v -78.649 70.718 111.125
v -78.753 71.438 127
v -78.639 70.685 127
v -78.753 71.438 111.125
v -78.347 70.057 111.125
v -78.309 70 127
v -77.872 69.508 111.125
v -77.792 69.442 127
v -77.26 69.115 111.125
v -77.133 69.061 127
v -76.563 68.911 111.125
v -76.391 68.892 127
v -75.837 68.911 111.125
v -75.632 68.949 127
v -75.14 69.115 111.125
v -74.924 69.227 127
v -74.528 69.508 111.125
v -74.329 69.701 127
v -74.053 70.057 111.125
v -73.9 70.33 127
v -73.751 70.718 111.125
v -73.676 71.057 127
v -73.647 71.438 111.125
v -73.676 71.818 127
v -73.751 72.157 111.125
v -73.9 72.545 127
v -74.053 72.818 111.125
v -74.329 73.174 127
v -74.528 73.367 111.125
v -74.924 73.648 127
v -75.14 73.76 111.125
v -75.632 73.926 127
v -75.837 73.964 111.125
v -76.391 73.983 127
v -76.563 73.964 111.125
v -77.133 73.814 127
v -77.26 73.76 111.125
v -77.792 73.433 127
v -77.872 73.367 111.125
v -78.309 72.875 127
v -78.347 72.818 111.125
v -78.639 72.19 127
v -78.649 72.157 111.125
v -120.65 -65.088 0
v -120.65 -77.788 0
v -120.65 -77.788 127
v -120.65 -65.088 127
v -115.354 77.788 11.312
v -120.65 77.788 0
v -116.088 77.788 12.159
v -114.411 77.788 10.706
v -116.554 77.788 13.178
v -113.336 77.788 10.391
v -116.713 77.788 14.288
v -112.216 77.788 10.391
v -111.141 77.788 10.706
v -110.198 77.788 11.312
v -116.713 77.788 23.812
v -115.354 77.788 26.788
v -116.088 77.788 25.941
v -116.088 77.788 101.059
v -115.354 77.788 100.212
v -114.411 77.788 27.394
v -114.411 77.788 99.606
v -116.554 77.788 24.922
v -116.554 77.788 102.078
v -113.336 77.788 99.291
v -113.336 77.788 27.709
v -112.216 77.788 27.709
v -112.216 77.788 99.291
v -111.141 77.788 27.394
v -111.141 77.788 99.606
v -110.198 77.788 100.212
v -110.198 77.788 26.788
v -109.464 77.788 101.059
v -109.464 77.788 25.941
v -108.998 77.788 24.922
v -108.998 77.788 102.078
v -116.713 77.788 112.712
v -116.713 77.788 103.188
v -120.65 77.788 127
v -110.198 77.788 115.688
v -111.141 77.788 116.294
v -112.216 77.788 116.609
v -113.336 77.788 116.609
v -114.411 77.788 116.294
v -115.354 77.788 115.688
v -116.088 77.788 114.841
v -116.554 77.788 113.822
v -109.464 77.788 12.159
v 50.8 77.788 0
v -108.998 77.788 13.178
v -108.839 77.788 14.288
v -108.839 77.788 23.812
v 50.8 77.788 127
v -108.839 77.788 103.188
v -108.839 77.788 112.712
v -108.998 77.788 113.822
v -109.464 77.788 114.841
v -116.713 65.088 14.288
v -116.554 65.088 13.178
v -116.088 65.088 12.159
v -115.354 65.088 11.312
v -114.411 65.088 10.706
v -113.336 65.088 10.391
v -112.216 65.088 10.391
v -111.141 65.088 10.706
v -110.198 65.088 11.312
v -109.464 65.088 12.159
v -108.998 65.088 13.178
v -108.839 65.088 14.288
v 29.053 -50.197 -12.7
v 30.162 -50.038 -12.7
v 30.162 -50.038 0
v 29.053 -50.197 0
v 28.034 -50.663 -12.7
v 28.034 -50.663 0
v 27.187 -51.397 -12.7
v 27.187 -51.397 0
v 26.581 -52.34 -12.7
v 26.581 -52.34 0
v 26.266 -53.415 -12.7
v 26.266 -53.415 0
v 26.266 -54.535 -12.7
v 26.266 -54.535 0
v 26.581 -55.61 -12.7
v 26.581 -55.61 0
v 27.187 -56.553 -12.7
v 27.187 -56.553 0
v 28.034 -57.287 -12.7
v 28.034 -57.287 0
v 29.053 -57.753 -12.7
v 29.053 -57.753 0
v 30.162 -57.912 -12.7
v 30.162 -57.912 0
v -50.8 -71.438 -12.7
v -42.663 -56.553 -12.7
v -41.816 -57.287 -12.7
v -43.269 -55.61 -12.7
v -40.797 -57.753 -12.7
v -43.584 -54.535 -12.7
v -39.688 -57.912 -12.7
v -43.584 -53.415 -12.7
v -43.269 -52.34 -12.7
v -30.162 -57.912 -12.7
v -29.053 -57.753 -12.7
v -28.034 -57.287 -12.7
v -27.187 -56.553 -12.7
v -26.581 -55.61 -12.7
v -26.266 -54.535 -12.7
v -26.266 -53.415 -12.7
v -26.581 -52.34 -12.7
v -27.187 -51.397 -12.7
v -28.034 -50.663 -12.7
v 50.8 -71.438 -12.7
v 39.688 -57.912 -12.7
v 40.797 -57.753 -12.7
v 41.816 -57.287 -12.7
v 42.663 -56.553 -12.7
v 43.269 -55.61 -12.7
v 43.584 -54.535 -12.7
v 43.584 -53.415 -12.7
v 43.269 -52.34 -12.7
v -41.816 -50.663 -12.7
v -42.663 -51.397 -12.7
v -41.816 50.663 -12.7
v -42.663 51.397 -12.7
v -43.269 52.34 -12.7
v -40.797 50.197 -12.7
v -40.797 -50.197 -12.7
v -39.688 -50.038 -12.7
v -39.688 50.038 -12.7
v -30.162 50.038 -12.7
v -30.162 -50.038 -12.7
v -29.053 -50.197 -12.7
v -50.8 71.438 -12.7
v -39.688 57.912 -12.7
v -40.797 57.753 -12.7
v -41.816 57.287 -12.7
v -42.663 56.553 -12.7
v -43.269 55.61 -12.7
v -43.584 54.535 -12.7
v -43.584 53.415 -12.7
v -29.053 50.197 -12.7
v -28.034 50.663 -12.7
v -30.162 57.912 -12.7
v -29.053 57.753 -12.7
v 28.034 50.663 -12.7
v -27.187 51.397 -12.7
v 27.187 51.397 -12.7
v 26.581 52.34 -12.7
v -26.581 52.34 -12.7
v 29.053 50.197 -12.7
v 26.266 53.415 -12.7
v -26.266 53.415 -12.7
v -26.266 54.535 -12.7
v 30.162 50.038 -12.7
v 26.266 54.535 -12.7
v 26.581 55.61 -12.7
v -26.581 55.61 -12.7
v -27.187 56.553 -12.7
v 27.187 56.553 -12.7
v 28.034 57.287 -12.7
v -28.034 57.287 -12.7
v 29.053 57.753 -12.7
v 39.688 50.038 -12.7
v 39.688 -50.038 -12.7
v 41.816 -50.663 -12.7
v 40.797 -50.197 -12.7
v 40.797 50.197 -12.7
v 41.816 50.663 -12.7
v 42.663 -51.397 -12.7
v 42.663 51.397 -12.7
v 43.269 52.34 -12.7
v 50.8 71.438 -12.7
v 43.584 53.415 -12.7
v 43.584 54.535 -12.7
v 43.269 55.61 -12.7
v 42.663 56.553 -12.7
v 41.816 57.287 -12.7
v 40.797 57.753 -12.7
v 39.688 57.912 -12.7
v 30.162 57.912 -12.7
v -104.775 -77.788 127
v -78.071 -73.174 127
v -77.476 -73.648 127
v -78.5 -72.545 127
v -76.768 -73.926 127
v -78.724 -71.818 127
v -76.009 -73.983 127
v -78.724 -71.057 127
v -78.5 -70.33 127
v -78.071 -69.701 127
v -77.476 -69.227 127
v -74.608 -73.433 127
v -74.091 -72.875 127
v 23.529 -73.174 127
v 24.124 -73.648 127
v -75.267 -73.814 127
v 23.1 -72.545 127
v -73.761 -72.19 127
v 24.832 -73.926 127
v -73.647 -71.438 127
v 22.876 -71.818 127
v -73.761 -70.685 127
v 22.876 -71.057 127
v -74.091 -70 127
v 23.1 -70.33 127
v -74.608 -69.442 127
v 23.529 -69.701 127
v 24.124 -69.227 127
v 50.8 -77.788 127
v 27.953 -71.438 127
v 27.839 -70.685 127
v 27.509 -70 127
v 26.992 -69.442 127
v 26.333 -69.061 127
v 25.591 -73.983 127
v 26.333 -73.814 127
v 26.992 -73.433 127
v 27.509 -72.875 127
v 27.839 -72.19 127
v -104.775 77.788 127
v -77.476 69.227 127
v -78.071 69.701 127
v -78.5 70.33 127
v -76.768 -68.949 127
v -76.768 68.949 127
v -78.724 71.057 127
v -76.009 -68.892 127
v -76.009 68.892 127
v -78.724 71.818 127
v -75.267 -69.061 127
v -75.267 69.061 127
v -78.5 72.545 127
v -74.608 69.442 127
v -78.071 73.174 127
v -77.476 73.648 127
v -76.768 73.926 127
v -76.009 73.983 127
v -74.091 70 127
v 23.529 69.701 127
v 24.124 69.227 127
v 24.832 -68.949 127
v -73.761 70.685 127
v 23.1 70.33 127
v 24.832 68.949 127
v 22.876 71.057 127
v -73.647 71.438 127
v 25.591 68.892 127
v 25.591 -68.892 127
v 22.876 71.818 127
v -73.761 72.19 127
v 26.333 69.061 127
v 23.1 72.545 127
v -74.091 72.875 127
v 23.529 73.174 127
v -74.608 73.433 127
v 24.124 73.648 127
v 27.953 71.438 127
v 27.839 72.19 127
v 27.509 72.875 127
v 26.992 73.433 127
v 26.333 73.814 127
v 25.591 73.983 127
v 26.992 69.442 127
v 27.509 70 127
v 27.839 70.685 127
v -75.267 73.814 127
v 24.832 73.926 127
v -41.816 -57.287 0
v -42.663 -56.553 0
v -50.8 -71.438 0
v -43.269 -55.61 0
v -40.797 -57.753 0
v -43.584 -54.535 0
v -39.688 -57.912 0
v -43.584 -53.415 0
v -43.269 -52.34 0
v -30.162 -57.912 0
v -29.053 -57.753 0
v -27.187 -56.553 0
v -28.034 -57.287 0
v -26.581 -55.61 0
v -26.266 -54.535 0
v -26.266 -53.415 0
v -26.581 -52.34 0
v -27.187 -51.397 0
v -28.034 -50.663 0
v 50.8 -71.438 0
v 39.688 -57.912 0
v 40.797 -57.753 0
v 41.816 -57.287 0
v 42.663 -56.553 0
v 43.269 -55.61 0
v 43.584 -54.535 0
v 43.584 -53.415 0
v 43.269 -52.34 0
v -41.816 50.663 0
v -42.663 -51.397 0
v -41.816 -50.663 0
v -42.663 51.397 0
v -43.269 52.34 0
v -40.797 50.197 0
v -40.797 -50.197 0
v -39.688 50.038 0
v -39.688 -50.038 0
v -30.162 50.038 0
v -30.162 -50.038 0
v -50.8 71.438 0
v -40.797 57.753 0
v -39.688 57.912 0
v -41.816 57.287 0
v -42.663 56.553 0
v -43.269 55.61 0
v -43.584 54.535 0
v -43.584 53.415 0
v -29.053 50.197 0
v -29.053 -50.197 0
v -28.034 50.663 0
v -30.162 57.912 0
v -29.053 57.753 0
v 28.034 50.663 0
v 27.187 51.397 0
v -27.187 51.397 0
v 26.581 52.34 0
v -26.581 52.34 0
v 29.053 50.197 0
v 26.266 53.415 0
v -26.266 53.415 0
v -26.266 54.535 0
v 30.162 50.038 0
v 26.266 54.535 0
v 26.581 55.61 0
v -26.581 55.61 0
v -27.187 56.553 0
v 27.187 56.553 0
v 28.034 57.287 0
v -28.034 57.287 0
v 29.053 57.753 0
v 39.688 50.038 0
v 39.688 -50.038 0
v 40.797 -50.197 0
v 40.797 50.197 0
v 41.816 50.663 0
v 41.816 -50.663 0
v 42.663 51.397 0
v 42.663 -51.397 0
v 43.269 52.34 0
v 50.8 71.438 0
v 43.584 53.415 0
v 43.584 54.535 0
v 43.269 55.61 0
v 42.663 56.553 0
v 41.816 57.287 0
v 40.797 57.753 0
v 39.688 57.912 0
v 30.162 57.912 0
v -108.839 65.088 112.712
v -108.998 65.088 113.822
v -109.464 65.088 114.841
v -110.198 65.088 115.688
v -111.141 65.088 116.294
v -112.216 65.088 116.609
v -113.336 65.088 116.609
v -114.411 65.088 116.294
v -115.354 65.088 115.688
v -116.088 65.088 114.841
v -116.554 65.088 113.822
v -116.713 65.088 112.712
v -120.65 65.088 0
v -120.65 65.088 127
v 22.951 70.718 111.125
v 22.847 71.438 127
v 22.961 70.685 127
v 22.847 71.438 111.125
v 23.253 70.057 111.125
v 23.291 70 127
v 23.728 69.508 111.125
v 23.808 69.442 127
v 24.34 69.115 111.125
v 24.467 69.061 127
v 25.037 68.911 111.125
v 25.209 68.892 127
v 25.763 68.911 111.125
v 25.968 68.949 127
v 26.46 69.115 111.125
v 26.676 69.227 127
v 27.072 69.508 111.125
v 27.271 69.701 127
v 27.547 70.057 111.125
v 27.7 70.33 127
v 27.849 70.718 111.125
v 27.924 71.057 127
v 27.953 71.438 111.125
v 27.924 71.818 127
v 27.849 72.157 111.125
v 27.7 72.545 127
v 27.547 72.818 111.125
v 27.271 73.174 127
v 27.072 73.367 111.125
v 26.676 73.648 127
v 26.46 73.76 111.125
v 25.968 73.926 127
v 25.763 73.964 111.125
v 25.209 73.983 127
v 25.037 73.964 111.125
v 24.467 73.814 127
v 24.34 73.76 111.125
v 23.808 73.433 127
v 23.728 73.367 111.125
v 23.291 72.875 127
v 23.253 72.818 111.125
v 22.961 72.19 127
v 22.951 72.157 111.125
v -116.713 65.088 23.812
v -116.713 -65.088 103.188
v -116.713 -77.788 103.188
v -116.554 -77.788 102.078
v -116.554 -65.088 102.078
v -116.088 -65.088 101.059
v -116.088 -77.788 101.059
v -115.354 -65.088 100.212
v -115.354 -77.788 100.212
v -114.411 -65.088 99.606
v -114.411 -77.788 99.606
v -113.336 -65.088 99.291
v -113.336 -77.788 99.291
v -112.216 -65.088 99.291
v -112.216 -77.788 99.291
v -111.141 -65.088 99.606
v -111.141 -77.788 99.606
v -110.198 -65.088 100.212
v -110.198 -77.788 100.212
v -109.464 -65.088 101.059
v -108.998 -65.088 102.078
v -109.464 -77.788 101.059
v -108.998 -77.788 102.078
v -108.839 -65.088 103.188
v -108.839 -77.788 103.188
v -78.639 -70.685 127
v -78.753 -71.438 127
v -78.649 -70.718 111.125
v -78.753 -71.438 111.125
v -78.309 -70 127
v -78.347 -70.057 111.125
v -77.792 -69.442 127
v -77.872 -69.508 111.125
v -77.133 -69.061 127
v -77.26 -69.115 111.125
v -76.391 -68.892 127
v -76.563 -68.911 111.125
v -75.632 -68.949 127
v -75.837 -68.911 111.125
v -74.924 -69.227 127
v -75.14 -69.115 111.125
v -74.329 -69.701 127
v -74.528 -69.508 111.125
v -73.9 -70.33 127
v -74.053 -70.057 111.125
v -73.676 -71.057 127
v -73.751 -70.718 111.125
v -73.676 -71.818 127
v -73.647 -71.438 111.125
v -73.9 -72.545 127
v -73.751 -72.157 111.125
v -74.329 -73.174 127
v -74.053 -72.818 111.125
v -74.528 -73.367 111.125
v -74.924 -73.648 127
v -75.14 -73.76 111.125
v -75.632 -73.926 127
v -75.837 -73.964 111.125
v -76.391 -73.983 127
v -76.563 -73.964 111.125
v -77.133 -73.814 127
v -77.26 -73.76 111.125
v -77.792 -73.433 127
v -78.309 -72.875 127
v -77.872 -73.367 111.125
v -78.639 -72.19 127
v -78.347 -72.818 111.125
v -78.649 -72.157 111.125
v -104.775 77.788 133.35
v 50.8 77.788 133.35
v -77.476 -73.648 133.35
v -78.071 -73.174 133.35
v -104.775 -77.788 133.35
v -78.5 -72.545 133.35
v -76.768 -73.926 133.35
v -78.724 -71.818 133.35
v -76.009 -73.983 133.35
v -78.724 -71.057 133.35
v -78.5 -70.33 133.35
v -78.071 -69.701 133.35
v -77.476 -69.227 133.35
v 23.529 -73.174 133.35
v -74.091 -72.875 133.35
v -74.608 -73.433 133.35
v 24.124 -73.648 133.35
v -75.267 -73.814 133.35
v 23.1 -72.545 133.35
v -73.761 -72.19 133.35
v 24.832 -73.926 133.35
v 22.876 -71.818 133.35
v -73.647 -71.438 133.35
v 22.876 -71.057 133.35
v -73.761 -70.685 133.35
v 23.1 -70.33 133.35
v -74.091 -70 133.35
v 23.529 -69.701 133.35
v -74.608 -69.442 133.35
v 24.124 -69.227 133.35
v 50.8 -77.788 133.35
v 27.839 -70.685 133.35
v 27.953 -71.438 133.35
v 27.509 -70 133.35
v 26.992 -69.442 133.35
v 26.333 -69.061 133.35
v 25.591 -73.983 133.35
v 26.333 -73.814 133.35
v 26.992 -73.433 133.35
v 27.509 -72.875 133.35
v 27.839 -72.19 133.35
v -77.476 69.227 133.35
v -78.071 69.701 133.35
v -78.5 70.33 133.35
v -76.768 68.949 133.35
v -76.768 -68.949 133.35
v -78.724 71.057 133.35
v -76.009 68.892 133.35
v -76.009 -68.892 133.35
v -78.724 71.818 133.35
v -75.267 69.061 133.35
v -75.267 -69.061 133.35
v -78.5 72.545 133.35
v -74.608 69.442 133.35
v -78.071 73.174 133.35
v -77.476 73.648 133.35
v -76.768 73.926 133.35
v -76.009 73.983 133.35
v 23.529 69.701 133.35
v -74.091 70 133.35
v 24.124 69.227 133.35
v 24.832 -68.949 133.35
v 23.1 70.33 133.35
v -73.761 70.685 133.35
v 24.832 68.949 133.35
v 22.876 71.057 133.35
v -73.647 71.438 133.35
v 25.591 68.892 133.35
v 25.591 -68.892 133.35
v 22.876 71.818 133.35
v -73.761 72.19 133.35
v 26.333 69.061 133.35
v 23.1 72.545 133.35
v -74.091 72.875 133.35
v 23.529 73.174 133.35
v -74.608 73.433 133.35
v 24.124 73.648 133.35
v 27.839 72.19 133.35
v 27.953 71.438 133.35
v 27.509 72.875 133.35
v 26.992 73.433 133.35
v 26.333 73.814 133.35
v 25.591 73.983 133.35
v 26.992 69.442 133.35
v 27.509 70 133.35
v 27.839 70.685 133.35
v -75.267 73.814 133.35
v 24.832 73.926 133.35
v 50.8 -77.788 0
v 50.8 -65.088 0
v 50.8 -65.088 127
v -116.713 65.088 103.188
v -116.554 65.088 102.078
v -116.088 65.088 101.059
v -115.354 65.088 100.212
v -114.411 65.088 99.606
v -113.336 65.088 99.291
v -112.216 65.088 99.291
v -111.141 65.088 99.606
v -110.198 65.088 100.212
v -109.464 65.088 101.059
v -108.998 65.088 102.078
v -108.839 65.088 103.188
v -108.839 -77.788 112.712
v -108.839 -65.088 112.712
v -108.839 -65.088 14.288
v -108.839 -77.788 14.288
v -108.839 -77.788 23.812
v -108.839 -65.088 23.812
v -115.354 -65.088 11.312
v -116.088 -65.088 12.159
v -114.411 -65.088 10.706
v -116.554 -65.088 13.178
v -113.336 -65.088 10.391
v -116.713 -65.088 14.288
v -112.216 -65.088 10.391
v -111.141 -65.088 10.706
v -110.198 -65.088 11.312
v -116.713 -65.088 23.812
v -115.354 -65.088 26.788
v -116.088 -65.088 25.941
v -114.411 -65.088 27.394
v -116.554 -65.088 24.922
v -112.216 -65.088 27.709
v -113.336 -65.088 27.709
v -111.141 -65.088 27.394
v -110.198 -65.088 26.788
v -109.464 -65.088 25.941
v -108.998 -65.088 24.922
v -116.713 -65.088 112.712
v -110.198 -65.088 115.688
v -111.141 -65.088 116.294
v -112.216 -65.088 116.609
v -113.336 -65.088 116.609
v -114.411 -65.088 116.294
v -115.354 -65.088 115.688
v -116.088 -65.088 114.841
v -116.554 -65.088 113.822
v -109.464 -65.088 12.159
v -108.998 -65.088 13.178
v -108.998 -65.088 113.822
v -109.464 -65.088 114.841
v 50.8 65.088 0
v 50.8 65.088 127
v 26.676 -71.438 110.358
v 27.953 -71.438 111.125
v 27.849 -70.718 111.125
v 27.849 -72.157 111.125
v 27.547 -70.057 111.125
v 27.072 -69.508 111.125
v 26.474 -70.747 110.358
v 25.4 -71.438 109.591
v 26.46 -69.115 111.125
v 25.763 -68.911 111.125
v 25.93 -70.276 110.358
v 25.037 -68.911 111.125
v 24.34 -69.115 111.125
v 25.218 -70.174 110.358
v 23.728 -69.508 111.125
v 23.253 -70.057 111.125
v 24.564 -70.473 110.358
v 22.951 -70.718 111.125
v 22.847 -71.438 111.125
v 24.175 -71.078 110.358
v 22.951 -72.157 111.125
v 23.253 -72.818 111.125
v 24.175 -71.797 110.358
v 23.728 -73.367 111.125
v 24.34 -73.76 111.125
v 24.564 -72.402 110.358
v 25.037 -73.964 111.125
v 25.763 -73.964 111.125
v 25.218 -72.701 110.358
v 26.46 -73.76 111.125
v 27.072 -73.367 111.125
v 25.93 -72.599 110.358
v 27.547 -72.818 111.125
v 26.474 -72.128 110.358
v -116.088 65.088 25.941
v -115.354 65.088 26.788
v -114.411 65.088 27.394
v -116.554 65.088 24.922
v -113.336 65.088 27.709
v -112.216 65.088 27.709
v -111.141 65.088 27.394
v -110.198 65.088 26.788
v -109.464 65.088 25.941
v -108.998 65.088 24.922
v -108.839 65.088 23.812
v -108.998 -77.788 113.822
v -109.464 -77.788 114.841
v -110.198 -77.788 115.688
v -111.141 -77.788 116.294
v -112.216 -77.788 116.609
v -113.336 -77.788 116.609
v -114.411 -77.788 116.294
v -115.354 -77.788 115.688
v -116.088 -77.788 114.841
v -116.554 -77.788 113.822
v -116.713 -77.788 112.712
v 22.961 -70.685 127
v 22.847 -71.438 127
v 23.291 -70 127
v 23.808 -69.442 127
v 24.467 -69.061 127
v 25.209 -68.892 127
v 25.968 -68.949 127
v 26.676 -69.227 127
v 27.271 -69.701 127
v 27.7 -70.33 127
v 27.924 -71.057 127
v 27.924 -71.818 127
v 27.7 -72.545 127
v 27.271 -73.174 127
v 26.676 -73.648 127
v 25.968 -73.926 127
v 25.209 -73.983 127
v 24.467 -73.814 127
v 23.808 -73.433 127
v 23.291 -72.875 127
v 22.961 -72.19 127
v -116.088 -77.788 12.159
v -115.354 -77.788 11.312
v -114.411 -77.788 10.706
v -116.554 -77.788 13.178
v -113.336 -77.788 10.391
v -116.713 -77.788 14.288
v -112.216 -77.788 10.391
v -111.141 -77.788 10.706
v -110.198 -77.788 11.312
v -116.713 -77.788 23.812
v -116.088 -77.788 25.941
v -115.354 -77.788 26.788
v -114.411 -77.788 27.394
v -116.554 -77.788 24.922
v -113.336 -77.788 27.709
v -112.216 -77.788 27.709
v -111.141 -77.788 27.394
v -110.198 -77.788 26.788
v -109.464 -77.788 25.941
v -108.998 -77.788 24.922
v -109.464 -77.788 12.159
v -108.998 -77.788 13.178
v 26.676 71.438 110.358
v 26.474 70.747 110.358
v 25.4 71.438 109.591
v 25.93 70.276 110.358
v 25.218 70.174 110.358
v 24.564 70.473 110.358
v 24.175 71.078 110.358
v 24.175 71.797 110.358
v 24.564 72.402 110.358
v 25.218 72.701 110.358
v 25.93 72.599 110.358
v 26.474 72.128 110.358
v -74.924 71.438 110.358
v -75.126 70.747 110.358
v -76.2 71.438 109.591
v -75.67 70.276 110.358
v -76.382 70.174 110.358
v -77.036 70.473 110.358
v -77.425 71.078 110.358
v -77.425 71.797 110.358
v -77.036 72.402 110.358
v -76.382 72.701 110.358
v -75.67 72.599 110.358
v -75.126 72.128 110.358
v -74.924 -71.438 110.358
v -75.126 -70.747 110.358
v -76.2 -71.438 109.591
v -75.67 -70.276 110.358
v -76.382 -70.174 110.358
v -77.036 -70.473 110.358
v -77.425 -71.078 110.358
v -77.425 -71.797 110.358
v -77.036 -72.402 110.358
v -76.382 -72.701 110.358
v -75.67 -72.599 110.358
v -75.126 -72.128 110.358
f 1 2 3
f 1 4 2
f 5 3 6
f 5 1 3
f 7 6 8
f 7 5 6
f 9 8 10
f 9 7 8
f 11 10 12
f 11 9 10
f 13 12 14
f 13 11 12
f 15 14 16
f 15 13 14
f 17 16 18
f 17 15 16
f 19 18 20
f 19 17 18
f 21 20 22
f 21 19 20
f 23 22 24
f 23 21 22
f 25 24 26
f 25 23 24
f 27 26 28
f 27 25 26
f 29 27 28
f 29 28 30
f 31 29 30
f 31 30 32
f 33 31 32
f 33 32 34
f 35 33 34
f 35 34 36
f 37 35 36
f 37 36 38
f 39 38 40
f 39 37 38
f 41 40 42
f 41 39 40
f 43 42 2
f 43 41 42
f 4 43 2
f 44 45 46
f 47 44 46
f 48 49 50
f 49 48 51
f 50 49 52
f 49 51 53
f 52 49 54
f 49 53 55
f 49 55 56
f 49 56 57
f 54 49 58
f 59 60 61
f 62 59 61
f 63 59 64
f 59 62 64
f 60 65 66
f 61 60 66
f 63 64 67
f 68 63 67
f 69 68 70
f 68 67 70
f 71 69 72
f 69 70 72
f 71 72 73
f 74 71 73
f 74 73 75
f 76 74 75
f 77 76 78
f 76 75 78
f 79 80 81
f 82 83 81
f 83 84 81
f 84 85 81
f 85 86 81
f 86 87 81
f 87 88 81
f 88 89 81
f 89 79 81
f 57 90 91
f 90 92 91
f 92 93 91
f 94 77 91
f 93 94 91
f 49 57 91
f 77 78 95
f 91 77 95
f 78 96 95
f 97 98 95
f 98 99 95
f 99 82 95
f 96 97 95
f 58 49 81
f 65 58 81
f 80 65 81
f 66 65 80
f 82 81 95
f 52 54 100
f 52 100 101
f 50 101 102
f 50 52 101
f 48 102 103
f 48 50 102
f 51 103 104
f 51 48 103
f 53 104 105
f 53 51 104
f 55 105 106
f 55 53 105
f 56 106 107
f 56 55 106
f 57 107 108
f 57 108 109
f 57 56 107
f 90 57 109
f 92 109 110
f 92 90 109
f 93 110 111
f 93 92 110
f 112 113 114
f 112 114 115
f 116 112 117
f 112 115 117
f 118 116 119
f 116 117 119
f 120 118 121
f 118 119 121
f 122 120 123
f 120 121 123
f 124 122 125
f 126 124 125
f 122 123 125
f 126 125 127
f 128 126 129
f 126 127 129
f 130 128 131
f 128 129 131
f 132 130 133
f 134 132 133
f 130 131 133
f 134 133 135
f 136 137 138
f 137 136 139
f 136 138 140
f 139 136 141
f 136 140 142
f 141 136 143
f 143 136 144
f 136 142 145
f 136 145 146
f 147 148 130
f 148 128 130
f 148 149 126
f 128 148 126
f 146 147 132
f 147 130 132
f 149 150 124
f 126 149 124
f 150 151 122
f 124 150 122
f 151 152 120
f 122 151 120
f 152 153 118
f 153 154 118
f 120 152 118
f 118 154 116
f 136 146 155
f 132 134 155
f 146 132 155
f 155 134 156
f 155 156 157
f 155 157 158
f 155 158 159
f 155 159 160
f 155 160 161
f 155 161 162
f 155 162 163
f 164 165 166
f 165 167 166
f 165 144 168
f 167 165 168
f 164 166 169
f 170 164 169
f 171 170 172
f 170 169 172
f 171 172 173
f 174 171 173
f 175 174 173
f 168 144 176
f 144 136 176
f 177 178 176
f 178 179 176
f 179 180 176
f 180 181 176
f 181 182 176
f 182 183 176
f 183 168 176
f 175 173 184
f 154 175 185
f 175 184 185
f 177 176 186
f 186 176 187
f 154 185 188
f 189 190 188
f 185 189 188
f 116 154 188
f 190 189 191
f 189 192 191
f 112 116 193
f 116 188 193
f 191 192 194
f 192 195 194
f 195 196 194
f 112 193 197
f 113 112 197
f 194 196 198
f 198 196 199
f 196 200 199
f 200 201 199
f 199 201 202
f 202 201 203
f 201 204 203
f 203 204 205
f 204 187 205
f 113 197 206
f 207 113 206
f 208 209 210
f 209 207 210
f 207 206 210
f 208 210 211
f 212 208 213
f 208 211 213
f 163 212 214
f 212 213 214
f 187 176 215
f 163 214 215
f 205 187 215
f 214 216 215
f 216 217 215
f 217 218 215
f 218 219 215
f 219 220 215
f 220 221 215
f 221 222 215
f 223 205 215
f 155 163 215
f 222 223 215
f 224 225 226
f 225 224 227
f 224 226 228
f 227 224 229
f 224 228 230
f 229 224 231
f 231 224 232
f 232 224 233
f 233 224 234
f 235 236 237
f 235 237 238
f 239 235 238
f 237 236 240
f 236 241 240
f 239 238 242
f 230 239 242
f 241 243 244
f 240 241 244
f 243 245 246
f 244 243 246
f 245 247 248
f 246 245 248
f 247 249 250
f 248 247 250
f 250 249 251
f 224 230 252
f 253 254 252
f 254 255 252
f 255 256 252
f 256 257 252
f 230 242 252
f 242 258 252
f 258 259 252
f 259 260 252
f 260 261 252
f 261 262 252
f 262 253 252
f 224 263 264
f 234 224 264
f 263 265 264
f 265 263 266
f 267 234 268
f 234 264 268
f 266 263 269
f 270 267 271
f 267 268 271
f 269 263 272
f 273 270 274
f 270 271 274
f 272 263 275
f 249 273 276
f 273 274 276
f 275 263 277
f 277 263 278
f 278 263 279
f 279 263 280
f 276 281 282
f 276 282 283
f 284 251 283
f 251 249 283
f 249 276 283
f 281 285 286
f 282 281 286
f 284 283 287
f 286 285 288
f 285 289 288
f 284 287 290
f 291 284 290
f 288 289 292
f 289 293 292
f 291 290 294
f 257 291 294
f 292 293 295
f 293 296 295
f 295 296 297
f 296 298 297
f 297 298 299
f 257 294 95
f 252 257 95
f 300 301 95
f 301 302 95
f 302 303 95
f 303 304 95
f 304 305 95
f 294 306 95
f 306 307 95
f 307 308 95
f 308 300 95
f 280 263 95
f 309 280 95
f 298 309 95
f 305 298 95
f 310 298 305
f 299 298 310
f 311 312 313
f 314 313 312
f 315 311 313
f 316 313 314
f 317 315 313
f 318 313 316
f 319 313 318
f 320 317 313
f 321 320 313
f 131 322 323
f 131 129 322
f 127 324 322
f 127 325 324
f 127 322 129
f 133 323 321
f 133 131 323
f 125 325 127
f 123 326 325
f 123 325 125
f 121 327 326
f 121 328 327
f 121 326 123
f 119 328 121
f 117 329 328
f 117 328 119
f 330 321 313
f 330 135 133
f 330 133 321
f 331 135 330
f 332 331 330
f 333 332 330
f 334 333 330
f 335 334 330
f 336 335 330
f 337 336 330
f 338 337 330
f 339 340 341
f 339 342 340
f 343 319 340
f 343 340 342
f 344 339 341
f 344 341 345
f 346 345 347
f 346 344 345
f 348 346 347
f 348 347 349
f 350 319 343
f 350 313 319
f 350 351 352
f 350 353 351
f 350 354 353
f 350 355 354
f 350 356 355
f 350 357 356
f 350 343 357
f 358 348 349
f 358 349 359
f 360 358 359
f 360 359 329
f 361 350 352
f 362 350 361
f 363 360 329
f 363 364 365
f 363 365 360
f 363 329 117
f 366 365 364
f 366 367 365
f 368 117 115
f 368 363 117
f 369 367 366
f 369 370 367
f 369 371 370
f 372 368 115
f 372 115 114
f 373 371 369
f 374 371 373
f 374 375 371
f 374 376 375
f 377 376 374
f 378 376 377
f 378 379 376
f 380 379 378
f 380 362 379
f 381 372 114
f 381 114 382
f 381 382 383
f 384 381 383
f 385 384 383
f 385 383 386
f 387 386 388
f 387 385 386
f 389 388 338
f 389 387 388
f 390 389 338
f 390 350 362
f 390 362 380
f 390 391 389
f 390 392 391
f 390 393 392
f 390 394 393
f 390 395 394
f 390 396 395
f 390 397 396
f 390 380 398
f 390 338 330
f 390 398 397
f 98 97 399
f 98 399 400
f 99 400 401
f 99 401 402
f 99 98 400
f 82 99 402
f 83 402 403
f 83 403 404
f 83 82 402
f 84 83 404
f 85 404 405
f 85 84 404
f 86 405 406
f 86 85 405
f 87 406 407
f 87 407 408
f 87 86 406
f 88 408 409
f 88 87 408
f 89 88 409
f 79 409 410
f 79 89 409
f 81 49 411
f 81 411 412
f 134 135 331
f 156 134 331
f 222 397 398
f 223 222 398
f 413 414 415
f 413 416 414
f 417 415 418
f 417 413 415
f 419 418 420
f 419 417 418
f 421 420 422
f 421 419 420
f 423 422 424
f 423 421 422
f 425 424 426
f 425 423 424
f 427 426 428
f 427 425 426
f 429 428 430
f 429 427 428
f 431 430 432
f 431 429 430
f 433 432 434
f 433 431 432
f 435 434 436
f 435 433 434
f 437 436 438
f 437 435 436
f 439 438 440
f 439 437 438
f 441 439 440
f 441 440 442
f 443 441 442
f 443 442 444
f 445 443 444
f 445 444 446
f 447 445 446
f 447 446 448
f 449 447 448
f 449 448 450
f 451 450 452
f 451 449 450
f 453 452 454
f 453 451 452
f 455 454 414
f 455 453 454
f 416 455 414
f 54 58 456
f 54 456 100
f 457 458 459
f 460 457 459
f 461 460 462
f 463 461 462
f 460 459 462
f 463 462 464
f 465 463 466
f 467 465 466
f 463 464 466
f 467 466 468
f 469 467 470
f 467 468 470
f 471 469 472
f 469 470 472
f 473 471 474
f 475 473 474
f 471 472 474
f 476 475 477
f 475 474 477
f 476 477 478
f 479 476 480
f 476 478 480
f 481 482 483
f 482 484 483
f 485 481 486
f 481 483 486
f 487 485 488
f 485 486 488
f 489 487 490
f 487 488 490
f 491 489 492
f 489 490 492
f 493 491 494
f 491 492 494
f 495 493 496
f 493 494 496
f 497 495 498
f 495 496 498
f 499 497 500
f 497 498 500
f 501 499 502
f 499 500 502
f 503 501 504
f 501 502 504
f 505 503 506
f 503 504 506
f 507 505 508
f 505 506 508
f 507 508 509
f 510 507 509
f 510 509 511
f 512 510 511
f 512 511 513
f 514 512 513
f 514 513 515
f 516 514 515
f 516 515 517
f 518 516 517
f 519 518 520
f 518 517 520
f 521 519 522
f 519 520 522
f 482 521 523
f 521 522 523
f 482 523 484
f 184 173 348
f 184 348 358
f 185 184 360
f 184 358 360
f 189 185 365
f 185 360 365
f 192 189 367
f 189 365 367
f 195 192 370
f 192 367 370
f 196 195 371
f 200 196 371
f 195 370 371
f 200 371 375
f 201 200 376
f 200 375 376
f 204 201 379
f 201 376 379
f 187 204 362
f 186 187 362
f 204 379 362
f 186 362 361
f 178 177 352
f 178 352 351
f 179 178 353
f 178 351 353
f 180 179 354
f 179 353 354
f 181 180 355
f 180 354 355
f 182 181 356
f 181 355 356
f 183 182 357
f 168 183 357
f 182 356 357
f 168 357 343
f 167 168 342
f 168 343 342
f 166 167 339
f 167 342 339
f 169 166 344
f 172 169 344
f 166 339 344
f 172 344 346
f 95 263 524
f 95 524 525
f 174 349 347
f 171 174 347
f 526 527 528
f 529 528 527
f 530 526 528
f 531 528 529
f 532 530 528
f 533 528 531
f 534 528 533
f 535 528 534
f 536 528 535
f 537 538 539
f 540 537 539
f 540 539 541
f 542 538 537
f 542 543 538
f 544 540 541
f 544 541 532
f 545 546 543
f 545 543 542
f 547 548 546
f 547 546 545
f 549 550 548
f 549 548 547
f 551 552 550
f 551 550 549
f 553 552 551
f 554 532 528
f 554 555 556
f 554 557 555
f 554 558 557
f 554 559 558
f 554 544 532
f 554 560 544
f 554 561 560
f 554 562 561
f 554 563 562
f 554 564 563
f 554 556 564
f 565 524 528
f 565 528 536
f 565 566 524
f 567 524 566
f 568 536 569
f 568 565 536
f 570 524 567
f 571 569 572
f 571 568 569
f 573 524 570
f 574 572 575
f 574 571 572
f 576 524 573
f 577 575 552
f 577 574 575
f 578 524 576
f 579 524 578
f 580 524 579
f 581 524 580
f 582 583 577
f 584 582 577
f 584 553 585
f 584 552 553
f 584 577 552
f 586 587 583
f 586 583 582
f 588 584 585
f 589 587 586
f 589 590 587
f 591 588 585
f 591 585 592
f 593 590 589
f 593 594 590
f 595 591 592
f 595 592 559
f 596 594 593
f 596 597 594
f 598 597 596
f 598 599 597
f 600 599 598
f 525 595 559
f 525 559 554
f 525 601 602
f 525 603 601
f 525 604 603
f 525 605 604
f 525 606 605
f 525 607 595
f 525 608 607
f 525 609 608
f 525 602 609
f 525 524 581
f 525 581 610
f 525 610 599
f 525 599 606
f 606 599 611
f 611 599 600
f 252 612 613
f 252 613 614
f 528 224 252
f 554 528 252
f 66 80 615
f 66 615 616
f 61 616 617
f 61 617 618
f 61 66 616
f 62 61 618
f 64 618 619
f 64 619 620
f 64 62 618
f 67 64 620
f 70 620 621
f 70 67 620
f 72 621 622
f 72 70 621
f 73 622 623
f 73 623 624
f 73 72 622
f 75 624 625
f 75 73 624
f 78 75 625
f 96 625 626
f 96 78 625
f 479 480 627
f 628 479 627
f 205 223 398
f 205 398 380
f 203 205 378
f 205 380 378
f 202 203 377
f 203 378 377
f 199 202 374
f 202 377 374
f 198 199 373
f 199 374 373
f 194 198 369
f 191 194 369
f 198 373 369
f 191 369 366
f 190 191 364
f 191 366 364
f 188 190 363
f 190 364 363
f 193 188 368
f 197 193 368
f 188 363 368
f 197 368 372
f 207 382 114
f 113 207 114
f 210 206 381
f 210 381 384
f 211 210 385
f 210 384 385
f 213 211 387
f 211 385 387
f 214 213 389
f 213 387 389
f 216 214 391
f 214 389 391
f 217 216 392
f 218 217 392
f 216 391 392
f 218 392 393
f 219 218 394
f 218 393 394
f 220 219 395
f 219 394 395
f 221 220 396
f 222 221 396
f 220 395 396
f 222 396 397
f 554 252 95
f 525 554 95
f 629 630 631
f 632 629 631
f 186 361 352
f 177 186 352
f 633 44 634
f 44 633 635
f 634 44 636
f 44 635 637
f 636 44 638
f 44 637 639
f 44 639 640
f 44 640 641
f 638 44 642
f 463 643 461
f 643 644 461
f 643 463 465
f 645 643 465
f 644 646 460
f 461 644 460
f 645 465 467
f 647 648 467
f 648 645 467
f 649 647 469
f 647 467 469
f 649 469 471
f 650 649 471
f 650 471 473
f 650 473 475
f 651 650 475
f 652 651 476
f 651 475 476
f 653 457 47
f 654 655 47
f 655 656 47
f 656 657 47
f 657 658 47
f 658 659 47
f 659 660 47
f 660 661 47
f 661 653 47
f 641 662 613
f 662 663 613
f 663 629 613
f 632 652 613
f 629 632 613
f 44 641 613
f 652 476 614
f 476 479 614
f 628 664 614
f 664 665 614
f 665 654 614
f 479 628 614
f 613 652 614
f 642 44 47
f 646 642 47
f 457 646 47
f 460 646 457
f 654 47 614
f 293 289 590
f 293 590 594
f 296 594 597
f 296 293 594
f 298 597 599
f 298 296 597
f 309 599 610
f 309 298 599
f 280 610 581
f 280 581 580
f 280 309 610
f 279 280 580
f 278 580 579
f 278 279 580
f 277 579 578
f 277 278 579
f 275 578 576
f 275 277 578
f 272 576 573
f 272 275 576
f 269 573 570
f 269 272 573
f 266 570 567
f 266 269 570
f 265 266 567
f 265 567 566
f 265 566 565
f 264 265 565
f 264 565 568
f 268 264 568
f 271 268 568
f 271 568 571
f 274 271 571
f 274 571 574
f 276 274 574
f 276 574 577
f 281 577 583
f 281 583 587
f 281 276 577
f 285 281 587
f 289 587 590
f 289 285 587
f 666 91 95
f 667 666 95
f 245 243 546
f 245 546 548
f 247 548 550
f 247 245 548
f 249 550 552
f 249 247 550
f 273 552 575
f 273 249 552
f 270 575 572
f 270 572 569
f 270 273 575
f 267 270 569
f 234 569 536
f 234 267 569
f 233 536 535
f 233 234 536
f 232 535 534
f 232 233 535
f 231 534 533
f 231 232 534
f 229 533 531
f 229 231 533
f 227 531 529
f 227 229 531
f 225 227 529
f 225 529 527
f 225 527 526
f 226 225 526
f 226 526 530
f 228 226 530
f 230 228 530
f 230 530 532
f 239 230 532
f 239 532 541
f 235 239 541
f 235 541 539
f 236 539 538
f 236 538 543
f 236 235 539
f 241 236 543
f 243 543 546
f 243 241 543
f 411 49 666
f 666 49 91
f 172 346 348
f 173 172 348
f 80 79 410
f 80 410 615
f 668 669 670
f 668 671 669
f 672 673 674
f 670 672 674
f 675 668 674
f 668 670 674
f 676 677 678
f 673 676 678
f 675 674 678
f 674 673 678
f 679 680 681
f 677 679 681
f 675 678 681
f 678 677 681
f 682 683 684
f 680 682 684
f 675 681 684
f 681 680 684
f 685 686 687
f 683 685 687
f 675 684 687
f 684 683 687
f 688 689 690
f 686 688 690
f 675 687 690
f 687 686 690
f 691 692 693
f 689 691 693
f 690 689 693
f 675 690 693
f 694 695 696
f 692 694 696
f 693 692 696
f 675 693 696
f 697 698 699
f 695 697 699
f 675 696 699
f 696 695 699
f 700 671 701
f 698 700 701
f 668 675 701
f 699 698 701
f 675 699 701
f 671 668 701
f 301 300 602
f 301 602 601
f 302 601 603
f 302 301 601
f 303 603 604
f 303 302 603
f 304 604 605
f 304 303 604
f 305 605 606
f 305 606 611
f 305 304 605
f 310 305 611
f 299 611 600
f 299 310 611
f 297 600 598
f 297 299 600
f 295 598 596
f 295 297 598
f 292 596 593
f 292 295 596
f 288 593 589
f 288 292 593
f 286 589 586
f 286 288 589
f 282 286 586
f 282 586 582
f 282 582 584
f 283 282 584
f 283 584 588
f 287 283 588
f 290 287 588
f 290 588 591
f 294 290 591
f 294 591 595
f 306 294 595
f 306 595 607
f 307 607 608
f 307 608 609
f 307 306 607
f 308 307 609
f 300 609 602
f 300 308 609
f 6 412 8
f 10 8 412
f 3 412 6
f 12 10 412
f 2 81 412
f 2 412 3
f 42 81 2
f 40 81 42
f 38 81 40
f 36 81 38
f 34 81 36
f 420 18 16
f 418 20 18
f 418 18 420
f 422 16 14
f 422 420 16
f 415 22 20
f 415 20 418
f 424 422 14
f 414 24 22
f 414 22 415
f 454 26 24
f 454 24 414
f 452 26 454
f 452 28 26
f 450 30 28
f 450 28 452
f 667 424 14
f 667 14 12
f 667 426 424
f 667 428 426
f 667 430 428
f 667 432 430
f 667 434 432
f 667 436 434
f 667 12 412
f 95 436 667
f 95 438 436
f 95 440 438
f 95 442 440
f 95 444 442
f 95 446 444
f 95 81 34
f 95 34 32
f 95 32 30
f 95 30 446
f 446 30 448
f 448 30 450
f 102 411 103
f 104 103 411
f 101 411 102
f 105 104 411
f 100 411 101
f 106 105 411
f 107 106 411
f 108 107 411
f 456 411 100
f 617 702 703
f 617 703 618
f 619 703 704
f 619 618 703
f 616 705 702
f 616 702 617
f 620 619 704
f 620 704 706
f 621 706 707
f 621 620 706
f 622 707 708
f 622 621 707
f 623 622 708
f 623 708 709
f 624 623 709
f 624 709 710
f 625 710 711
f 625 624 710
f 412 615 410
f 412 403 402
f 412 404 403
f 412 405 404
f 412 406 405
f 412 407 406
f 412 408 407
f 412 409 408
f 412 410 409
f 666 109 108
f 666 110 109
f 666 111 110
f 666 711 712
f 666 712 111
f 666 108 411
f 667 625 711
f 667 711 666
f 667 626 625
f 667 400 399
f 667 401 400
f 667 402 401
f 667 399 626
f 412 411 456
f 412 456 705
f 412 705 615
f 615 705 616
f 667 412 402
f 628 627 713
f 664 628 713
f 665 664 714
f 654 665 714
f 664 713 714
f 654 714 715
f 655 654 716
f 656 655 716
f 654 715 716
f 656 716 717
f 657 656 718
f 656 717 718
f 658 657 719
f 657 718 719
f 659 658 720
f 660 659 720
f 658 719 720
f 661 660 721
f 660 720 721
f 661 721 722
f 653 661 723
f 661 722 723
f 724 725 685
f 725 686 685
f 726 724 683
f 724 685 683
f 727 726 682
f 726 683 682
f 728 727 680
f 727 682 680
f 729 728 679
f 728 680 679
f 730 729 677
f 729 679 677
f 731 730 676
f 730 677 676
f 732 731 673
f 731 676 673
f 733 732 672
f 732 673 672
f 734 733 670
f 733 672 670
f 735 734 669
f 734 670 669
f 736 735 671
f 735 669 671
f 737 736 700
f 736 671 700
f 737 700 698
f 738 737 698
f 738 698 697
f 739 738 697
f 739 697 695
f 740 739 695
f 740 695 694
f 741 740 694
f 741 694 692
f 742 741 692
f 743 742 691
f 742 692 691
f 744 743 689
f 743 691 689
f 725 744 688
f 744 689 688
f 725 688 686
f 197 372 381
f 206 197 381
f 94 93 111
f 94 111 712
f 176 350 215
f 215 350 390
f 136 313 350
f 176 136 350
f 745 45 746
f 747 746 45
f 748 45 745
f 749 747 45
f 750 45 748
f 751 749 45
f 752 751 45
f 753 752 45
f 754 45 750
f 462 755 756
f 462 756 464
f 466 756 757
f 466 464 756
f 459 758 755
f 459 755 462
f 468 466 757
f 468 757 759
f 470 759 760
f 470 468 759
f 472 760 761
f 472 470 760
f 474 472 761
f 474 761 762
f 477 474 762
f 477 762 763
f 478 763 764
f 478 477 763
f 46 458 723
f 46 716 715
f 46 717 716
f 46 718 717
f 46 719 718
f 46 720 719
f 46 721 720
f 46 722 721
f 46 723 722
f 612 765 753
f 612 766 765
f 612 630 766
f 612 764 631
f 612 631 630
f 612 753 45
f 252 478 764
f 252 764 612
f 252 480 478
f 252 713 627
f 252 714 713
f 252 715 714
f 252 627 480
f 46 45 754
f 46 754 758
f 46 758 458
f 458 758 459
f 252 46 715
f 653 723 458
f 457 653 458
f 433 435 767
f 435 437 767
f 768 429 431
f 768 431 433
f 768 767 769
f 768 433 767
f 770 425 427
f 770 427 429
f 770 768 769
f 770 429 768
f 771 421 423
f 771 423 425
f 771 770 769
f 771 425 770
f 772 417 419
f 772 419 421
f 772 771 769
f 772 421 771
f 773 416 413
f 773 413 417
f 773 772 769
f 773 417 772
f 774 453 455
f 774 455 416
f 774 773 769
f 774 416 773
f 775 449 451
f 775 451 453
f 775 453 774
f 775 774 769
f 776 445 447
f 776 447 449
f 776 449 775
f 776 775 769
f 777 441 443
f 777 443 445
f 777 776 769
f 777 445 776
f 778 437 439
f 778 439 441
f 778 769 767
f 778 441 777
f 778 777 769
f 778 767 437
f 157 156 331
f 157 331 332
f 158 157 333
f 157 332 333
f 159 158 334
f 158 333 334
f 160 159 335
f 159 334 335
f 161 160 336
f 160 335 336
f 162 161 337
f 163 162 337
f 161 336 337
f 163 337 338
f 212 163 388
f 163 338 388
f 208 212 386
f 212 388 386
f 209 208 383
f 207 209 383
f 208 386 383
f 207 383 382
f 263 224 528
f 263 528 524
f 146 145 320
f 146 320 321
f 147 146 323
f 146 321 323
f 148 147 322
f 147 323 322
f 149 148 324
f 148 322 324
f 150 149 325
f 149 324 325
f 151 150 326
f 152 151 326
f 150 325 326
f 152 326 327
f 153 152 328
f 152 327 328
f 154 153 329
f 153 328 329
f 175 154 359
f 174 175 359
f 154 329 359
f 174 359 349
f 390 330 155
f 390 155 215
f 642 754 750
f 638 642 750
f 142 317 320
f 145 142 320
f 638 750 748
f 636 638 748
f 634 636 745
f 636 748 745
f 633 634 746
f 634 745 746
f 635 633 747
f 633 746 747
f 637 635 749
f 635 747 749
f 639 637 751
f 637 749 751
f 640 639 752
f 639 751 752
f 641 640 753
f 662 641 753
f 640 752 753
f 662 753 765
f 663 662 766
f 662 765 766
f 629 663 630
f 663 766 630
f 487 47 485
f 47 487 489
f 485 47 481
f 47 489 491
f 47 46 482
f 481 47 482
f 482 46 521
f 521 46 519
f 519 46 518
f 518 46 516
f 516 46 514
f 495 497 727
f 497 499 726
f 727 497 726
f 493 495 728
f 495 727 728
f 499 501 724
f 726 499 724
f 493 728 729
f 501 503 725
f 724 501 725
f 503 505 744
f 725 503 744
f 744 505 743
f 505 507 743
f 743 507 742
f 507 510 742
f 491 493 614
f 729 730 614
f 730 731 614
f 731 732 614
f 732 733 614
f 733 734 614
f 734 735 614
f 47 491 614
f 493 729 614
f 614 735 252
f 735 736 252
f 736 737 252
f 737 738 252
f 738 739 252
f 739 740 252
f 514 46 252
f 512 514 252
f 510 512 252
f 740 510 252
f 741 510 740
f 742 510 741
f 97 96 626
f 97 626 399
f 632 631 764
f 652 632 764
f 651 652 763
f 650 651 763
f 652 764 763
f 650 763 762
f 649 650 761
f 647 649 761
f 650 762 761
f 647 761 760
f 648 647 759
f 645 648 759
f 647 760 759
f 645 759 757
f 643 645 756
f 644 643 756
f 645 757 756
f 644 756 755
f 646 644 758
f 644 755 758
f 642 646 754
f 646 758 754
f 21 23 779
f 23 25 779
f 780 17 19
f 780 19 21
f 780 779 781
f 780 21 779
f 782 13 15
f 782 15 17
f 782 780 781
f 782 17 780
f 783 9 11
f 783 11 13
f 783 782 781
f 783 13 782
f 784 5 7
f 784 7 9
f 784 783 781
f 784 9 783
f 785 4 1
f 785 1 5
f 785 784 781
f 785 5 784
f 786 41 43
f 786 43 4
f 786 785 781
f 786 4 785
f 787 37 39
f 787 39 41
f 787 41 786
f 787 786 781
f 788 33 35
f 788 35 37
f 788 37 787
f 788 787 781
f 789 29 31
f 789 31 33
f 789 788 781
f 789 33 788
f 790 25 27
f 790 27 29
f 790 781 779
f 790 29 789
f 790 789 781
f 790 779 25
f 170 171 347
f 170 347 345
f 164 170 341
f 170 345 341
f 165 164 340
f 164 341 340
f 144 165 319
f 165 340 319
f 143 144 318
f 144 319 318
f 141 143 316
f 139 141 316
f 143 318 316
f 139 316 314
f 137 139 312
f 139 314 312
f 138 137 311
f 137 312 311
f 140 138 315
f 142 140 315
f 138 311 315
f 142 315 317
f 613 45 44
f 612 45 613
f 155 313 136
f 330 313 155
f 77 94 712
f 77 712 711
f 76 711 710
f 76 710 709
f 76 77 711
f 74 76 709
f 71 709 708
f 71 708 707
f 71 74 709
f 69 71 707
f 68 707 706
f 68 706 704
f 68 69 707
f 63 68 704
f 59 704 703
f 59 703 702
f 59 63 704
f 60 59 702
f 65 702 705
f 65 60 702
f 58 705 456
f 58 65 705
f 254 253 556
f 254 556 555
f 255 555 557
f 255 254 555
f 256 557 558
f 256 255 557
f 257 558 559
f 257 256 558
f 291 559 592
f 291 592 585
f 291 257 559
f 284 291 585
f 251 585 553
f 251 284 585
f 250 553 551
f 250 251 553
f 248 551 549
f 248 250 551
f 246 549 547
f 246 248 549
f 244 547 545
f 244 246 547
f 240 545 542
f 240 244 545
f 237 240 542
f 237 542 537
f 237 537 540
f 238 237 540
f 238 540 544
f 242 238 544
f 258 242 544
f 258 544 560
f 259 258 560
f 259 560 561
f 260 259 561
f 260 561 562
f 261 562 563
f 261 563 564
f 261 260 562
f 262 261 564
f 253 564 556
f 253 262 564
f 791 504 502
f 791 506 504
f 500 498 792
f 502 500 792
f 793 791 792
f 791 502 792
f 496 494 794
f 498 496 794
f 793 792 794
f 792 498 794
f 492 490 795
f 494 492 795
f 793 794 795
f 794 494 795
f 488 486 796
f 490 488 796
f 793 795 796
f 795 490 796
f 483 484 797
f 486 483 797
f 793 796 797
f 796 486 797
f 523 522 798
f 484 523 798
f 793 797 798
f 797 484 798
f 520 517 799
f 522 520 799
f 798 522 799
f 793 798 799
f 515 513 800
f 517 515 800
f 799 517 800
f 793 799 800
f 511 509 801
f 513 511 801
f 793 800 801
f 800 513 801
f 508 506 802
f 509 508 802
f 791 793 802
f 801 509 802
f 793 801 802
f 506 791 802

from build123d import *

# Parameters (mm, degrees)
F0_W      = 101.6
F0_H      = 142.875
F1_DEPTH  = 12.7
F3_DEPTH  = 12.701
F4_W      = 171.45
F4_H      = 127
F5_DEPTH  = 6.35
F7_DEPTH  = 149.226
F9_D      = 5.1054
F9_DEPTH  = 15.875
F9_TIP    = 1.5338169022
F11_W     = 155.575
F11_H     = 155.575
F11_R     = 2.5527
F12_DEPTH = 6.35


with BuildPart() as f1:
    # F0 (on Top) → F1 (new body)
    with BuildSketch(Plane.XY):
        Rectangle(F0_W, F0_H)
    extrude(amount=-F1_DEPTH)

    # F2 (on face) → F3 (cut, through all)
    with BuildSketch(Plane.XY):
        with BuildLine():
            ThreePointArc((-39.6875, -50.038), (-43.6245, -53.975), (-39.6875, -57.912))
            Line((-39.6875, -57.912), (-30.1625, -57.912))
            ThreePointArc((-30.1625, -57.912), (-26.2255, -53.975), (-30.1625, -50.038))
            Line((-30.1625, -50.038), (-39.6875, -50.038))
        make_face()
        with BuildLine():
            Line((30.1625, -57.912), (39.6875, -57.912))
            ThreePointArc((39.6875, -57.912), (43.6245, -53.975), (39.6875, -50.038))
            Line((39.6875, -50.038), (30.1625, -50.038))
            ThreePointArc((30.1625, -50.038), (26.2255, -53.975), (30.1625, -57.912))
        make_face()
        with BuildLine():
            ThreePointArc((-39.6875, 57.912), (-43.6245, 53.975), (-39.6875, 50.038))
            Line((-39.6875, 50.038), (-30.1625, 50.038))
            ThreePointArc((-30.1625, 50.038), (-26.2255, 53.975), (-30.1625, 57.912))
            Line((-30.1625, 57.912), (-39.6875, 57.912))
        make_face()
        with BuildLine():
            ThreePointArc((39.6875, 50.038), (43.6245, 53.975), (39.6875, 57.912))
            Line((39.6875, 57.912), (30.1625, 57.912))
            ThreePointArc((30.1625, 57.912), (26.2255, 53.975), (30.1625, 50.038))
            Line((30.1625, 50.038), (39.6875, 50.038))
        make_face()
    extrude(amount=-F3_DEPTH, mode=Mode.SUBTRACT)


with BuildPart() as f5:
    # F4 (on face) → F5 (new body, symmetric)
    with BuildSketch(Plane.XZ.offset(71.4375)):
        with Locations((-34.925, 63.5)):
            Rectangle(F4_W, F4_H)
    extrude(amount=F5_DEPTH, both=True)

    # F6 (on face) → F7 (cut, through all)
    with BuildSketch(Plane.XZ.offset(77.7875)):
        with BuildLine():
            ThreePointArc((-116.713, 103.1875), (-112.776, 99.2505), (-108.839, 103.1875))
            Line((-108.839, 103.1875), (-108.839, 112.7125))
            ThreePointArc((-108.839, 112.7125), (-112.776, 116.6495), (-116.713, 112.7125))
            Line((-116.713, 112.7125), (-116.713, 103.1875))
        make_face()
        with BuildLine():
            ThreePointArc((-116.713, 14.2875), (-112.776, 10.3505), (-108.839, 14.2875))
            Line((-108.839, 14.2875), (-108.839, 23.8125))
            ThreePointArc((-108.839, 23.8125), (-112.776, 27.7495), (-116.713, 23.8125))
            Line((-116.713, 23.8125), (-116.713, 14.2875))
        make_face()
    extrude(amount=-F7_DEPTH, mode=Mode.SUBTRACT)

    # F9
    with Locations(Plane.XY.offset(127)):
        with Locations((-76.2, -71.4375), (25.4, -71.4375)):
            Hole(F9_D / 2, depth=F9_DEPTH)
            with Locations((0, 0, -(F9_DEPTH + F9_TIP / 2))):  # 118° drill point
                Cone(0, F9_D / 2, F9_TIP, mode=Mode.SUBTRACT)


with BuildPart() as f10_1:
    # F10: instance of F5
    add(f5.part.mirror(Plane.XZ))


with BuildPart() as f12:
    # F11 (on face) → F12 (new body)
    with BuildSketch(Plane.XY.offset(127)):
        with Locations((-26.9875, 0)):
            Rectangle(F11_W, F11_H)
        with Locations((-76.2, -71.4375)):
            Circle(F11_R, mode=Mode.SUBTRACT)
        with Locations((25.4, -71.4375)):
            Circle(F11_R, mode=Mode.SUBTRACT)
        with Locations((-76.2, 71.4375)):
            Circle(F11_R, mode=Mode.SUBTRACT)
        with Locations((25.4, 71.4375)):
            Circle(F11_R, mode=Mode.SUBTRACT)
    extrude(amount=F12_DEPTH)


solid = Compound([f1.part, f5.part, f10_1.part, f12.part])
